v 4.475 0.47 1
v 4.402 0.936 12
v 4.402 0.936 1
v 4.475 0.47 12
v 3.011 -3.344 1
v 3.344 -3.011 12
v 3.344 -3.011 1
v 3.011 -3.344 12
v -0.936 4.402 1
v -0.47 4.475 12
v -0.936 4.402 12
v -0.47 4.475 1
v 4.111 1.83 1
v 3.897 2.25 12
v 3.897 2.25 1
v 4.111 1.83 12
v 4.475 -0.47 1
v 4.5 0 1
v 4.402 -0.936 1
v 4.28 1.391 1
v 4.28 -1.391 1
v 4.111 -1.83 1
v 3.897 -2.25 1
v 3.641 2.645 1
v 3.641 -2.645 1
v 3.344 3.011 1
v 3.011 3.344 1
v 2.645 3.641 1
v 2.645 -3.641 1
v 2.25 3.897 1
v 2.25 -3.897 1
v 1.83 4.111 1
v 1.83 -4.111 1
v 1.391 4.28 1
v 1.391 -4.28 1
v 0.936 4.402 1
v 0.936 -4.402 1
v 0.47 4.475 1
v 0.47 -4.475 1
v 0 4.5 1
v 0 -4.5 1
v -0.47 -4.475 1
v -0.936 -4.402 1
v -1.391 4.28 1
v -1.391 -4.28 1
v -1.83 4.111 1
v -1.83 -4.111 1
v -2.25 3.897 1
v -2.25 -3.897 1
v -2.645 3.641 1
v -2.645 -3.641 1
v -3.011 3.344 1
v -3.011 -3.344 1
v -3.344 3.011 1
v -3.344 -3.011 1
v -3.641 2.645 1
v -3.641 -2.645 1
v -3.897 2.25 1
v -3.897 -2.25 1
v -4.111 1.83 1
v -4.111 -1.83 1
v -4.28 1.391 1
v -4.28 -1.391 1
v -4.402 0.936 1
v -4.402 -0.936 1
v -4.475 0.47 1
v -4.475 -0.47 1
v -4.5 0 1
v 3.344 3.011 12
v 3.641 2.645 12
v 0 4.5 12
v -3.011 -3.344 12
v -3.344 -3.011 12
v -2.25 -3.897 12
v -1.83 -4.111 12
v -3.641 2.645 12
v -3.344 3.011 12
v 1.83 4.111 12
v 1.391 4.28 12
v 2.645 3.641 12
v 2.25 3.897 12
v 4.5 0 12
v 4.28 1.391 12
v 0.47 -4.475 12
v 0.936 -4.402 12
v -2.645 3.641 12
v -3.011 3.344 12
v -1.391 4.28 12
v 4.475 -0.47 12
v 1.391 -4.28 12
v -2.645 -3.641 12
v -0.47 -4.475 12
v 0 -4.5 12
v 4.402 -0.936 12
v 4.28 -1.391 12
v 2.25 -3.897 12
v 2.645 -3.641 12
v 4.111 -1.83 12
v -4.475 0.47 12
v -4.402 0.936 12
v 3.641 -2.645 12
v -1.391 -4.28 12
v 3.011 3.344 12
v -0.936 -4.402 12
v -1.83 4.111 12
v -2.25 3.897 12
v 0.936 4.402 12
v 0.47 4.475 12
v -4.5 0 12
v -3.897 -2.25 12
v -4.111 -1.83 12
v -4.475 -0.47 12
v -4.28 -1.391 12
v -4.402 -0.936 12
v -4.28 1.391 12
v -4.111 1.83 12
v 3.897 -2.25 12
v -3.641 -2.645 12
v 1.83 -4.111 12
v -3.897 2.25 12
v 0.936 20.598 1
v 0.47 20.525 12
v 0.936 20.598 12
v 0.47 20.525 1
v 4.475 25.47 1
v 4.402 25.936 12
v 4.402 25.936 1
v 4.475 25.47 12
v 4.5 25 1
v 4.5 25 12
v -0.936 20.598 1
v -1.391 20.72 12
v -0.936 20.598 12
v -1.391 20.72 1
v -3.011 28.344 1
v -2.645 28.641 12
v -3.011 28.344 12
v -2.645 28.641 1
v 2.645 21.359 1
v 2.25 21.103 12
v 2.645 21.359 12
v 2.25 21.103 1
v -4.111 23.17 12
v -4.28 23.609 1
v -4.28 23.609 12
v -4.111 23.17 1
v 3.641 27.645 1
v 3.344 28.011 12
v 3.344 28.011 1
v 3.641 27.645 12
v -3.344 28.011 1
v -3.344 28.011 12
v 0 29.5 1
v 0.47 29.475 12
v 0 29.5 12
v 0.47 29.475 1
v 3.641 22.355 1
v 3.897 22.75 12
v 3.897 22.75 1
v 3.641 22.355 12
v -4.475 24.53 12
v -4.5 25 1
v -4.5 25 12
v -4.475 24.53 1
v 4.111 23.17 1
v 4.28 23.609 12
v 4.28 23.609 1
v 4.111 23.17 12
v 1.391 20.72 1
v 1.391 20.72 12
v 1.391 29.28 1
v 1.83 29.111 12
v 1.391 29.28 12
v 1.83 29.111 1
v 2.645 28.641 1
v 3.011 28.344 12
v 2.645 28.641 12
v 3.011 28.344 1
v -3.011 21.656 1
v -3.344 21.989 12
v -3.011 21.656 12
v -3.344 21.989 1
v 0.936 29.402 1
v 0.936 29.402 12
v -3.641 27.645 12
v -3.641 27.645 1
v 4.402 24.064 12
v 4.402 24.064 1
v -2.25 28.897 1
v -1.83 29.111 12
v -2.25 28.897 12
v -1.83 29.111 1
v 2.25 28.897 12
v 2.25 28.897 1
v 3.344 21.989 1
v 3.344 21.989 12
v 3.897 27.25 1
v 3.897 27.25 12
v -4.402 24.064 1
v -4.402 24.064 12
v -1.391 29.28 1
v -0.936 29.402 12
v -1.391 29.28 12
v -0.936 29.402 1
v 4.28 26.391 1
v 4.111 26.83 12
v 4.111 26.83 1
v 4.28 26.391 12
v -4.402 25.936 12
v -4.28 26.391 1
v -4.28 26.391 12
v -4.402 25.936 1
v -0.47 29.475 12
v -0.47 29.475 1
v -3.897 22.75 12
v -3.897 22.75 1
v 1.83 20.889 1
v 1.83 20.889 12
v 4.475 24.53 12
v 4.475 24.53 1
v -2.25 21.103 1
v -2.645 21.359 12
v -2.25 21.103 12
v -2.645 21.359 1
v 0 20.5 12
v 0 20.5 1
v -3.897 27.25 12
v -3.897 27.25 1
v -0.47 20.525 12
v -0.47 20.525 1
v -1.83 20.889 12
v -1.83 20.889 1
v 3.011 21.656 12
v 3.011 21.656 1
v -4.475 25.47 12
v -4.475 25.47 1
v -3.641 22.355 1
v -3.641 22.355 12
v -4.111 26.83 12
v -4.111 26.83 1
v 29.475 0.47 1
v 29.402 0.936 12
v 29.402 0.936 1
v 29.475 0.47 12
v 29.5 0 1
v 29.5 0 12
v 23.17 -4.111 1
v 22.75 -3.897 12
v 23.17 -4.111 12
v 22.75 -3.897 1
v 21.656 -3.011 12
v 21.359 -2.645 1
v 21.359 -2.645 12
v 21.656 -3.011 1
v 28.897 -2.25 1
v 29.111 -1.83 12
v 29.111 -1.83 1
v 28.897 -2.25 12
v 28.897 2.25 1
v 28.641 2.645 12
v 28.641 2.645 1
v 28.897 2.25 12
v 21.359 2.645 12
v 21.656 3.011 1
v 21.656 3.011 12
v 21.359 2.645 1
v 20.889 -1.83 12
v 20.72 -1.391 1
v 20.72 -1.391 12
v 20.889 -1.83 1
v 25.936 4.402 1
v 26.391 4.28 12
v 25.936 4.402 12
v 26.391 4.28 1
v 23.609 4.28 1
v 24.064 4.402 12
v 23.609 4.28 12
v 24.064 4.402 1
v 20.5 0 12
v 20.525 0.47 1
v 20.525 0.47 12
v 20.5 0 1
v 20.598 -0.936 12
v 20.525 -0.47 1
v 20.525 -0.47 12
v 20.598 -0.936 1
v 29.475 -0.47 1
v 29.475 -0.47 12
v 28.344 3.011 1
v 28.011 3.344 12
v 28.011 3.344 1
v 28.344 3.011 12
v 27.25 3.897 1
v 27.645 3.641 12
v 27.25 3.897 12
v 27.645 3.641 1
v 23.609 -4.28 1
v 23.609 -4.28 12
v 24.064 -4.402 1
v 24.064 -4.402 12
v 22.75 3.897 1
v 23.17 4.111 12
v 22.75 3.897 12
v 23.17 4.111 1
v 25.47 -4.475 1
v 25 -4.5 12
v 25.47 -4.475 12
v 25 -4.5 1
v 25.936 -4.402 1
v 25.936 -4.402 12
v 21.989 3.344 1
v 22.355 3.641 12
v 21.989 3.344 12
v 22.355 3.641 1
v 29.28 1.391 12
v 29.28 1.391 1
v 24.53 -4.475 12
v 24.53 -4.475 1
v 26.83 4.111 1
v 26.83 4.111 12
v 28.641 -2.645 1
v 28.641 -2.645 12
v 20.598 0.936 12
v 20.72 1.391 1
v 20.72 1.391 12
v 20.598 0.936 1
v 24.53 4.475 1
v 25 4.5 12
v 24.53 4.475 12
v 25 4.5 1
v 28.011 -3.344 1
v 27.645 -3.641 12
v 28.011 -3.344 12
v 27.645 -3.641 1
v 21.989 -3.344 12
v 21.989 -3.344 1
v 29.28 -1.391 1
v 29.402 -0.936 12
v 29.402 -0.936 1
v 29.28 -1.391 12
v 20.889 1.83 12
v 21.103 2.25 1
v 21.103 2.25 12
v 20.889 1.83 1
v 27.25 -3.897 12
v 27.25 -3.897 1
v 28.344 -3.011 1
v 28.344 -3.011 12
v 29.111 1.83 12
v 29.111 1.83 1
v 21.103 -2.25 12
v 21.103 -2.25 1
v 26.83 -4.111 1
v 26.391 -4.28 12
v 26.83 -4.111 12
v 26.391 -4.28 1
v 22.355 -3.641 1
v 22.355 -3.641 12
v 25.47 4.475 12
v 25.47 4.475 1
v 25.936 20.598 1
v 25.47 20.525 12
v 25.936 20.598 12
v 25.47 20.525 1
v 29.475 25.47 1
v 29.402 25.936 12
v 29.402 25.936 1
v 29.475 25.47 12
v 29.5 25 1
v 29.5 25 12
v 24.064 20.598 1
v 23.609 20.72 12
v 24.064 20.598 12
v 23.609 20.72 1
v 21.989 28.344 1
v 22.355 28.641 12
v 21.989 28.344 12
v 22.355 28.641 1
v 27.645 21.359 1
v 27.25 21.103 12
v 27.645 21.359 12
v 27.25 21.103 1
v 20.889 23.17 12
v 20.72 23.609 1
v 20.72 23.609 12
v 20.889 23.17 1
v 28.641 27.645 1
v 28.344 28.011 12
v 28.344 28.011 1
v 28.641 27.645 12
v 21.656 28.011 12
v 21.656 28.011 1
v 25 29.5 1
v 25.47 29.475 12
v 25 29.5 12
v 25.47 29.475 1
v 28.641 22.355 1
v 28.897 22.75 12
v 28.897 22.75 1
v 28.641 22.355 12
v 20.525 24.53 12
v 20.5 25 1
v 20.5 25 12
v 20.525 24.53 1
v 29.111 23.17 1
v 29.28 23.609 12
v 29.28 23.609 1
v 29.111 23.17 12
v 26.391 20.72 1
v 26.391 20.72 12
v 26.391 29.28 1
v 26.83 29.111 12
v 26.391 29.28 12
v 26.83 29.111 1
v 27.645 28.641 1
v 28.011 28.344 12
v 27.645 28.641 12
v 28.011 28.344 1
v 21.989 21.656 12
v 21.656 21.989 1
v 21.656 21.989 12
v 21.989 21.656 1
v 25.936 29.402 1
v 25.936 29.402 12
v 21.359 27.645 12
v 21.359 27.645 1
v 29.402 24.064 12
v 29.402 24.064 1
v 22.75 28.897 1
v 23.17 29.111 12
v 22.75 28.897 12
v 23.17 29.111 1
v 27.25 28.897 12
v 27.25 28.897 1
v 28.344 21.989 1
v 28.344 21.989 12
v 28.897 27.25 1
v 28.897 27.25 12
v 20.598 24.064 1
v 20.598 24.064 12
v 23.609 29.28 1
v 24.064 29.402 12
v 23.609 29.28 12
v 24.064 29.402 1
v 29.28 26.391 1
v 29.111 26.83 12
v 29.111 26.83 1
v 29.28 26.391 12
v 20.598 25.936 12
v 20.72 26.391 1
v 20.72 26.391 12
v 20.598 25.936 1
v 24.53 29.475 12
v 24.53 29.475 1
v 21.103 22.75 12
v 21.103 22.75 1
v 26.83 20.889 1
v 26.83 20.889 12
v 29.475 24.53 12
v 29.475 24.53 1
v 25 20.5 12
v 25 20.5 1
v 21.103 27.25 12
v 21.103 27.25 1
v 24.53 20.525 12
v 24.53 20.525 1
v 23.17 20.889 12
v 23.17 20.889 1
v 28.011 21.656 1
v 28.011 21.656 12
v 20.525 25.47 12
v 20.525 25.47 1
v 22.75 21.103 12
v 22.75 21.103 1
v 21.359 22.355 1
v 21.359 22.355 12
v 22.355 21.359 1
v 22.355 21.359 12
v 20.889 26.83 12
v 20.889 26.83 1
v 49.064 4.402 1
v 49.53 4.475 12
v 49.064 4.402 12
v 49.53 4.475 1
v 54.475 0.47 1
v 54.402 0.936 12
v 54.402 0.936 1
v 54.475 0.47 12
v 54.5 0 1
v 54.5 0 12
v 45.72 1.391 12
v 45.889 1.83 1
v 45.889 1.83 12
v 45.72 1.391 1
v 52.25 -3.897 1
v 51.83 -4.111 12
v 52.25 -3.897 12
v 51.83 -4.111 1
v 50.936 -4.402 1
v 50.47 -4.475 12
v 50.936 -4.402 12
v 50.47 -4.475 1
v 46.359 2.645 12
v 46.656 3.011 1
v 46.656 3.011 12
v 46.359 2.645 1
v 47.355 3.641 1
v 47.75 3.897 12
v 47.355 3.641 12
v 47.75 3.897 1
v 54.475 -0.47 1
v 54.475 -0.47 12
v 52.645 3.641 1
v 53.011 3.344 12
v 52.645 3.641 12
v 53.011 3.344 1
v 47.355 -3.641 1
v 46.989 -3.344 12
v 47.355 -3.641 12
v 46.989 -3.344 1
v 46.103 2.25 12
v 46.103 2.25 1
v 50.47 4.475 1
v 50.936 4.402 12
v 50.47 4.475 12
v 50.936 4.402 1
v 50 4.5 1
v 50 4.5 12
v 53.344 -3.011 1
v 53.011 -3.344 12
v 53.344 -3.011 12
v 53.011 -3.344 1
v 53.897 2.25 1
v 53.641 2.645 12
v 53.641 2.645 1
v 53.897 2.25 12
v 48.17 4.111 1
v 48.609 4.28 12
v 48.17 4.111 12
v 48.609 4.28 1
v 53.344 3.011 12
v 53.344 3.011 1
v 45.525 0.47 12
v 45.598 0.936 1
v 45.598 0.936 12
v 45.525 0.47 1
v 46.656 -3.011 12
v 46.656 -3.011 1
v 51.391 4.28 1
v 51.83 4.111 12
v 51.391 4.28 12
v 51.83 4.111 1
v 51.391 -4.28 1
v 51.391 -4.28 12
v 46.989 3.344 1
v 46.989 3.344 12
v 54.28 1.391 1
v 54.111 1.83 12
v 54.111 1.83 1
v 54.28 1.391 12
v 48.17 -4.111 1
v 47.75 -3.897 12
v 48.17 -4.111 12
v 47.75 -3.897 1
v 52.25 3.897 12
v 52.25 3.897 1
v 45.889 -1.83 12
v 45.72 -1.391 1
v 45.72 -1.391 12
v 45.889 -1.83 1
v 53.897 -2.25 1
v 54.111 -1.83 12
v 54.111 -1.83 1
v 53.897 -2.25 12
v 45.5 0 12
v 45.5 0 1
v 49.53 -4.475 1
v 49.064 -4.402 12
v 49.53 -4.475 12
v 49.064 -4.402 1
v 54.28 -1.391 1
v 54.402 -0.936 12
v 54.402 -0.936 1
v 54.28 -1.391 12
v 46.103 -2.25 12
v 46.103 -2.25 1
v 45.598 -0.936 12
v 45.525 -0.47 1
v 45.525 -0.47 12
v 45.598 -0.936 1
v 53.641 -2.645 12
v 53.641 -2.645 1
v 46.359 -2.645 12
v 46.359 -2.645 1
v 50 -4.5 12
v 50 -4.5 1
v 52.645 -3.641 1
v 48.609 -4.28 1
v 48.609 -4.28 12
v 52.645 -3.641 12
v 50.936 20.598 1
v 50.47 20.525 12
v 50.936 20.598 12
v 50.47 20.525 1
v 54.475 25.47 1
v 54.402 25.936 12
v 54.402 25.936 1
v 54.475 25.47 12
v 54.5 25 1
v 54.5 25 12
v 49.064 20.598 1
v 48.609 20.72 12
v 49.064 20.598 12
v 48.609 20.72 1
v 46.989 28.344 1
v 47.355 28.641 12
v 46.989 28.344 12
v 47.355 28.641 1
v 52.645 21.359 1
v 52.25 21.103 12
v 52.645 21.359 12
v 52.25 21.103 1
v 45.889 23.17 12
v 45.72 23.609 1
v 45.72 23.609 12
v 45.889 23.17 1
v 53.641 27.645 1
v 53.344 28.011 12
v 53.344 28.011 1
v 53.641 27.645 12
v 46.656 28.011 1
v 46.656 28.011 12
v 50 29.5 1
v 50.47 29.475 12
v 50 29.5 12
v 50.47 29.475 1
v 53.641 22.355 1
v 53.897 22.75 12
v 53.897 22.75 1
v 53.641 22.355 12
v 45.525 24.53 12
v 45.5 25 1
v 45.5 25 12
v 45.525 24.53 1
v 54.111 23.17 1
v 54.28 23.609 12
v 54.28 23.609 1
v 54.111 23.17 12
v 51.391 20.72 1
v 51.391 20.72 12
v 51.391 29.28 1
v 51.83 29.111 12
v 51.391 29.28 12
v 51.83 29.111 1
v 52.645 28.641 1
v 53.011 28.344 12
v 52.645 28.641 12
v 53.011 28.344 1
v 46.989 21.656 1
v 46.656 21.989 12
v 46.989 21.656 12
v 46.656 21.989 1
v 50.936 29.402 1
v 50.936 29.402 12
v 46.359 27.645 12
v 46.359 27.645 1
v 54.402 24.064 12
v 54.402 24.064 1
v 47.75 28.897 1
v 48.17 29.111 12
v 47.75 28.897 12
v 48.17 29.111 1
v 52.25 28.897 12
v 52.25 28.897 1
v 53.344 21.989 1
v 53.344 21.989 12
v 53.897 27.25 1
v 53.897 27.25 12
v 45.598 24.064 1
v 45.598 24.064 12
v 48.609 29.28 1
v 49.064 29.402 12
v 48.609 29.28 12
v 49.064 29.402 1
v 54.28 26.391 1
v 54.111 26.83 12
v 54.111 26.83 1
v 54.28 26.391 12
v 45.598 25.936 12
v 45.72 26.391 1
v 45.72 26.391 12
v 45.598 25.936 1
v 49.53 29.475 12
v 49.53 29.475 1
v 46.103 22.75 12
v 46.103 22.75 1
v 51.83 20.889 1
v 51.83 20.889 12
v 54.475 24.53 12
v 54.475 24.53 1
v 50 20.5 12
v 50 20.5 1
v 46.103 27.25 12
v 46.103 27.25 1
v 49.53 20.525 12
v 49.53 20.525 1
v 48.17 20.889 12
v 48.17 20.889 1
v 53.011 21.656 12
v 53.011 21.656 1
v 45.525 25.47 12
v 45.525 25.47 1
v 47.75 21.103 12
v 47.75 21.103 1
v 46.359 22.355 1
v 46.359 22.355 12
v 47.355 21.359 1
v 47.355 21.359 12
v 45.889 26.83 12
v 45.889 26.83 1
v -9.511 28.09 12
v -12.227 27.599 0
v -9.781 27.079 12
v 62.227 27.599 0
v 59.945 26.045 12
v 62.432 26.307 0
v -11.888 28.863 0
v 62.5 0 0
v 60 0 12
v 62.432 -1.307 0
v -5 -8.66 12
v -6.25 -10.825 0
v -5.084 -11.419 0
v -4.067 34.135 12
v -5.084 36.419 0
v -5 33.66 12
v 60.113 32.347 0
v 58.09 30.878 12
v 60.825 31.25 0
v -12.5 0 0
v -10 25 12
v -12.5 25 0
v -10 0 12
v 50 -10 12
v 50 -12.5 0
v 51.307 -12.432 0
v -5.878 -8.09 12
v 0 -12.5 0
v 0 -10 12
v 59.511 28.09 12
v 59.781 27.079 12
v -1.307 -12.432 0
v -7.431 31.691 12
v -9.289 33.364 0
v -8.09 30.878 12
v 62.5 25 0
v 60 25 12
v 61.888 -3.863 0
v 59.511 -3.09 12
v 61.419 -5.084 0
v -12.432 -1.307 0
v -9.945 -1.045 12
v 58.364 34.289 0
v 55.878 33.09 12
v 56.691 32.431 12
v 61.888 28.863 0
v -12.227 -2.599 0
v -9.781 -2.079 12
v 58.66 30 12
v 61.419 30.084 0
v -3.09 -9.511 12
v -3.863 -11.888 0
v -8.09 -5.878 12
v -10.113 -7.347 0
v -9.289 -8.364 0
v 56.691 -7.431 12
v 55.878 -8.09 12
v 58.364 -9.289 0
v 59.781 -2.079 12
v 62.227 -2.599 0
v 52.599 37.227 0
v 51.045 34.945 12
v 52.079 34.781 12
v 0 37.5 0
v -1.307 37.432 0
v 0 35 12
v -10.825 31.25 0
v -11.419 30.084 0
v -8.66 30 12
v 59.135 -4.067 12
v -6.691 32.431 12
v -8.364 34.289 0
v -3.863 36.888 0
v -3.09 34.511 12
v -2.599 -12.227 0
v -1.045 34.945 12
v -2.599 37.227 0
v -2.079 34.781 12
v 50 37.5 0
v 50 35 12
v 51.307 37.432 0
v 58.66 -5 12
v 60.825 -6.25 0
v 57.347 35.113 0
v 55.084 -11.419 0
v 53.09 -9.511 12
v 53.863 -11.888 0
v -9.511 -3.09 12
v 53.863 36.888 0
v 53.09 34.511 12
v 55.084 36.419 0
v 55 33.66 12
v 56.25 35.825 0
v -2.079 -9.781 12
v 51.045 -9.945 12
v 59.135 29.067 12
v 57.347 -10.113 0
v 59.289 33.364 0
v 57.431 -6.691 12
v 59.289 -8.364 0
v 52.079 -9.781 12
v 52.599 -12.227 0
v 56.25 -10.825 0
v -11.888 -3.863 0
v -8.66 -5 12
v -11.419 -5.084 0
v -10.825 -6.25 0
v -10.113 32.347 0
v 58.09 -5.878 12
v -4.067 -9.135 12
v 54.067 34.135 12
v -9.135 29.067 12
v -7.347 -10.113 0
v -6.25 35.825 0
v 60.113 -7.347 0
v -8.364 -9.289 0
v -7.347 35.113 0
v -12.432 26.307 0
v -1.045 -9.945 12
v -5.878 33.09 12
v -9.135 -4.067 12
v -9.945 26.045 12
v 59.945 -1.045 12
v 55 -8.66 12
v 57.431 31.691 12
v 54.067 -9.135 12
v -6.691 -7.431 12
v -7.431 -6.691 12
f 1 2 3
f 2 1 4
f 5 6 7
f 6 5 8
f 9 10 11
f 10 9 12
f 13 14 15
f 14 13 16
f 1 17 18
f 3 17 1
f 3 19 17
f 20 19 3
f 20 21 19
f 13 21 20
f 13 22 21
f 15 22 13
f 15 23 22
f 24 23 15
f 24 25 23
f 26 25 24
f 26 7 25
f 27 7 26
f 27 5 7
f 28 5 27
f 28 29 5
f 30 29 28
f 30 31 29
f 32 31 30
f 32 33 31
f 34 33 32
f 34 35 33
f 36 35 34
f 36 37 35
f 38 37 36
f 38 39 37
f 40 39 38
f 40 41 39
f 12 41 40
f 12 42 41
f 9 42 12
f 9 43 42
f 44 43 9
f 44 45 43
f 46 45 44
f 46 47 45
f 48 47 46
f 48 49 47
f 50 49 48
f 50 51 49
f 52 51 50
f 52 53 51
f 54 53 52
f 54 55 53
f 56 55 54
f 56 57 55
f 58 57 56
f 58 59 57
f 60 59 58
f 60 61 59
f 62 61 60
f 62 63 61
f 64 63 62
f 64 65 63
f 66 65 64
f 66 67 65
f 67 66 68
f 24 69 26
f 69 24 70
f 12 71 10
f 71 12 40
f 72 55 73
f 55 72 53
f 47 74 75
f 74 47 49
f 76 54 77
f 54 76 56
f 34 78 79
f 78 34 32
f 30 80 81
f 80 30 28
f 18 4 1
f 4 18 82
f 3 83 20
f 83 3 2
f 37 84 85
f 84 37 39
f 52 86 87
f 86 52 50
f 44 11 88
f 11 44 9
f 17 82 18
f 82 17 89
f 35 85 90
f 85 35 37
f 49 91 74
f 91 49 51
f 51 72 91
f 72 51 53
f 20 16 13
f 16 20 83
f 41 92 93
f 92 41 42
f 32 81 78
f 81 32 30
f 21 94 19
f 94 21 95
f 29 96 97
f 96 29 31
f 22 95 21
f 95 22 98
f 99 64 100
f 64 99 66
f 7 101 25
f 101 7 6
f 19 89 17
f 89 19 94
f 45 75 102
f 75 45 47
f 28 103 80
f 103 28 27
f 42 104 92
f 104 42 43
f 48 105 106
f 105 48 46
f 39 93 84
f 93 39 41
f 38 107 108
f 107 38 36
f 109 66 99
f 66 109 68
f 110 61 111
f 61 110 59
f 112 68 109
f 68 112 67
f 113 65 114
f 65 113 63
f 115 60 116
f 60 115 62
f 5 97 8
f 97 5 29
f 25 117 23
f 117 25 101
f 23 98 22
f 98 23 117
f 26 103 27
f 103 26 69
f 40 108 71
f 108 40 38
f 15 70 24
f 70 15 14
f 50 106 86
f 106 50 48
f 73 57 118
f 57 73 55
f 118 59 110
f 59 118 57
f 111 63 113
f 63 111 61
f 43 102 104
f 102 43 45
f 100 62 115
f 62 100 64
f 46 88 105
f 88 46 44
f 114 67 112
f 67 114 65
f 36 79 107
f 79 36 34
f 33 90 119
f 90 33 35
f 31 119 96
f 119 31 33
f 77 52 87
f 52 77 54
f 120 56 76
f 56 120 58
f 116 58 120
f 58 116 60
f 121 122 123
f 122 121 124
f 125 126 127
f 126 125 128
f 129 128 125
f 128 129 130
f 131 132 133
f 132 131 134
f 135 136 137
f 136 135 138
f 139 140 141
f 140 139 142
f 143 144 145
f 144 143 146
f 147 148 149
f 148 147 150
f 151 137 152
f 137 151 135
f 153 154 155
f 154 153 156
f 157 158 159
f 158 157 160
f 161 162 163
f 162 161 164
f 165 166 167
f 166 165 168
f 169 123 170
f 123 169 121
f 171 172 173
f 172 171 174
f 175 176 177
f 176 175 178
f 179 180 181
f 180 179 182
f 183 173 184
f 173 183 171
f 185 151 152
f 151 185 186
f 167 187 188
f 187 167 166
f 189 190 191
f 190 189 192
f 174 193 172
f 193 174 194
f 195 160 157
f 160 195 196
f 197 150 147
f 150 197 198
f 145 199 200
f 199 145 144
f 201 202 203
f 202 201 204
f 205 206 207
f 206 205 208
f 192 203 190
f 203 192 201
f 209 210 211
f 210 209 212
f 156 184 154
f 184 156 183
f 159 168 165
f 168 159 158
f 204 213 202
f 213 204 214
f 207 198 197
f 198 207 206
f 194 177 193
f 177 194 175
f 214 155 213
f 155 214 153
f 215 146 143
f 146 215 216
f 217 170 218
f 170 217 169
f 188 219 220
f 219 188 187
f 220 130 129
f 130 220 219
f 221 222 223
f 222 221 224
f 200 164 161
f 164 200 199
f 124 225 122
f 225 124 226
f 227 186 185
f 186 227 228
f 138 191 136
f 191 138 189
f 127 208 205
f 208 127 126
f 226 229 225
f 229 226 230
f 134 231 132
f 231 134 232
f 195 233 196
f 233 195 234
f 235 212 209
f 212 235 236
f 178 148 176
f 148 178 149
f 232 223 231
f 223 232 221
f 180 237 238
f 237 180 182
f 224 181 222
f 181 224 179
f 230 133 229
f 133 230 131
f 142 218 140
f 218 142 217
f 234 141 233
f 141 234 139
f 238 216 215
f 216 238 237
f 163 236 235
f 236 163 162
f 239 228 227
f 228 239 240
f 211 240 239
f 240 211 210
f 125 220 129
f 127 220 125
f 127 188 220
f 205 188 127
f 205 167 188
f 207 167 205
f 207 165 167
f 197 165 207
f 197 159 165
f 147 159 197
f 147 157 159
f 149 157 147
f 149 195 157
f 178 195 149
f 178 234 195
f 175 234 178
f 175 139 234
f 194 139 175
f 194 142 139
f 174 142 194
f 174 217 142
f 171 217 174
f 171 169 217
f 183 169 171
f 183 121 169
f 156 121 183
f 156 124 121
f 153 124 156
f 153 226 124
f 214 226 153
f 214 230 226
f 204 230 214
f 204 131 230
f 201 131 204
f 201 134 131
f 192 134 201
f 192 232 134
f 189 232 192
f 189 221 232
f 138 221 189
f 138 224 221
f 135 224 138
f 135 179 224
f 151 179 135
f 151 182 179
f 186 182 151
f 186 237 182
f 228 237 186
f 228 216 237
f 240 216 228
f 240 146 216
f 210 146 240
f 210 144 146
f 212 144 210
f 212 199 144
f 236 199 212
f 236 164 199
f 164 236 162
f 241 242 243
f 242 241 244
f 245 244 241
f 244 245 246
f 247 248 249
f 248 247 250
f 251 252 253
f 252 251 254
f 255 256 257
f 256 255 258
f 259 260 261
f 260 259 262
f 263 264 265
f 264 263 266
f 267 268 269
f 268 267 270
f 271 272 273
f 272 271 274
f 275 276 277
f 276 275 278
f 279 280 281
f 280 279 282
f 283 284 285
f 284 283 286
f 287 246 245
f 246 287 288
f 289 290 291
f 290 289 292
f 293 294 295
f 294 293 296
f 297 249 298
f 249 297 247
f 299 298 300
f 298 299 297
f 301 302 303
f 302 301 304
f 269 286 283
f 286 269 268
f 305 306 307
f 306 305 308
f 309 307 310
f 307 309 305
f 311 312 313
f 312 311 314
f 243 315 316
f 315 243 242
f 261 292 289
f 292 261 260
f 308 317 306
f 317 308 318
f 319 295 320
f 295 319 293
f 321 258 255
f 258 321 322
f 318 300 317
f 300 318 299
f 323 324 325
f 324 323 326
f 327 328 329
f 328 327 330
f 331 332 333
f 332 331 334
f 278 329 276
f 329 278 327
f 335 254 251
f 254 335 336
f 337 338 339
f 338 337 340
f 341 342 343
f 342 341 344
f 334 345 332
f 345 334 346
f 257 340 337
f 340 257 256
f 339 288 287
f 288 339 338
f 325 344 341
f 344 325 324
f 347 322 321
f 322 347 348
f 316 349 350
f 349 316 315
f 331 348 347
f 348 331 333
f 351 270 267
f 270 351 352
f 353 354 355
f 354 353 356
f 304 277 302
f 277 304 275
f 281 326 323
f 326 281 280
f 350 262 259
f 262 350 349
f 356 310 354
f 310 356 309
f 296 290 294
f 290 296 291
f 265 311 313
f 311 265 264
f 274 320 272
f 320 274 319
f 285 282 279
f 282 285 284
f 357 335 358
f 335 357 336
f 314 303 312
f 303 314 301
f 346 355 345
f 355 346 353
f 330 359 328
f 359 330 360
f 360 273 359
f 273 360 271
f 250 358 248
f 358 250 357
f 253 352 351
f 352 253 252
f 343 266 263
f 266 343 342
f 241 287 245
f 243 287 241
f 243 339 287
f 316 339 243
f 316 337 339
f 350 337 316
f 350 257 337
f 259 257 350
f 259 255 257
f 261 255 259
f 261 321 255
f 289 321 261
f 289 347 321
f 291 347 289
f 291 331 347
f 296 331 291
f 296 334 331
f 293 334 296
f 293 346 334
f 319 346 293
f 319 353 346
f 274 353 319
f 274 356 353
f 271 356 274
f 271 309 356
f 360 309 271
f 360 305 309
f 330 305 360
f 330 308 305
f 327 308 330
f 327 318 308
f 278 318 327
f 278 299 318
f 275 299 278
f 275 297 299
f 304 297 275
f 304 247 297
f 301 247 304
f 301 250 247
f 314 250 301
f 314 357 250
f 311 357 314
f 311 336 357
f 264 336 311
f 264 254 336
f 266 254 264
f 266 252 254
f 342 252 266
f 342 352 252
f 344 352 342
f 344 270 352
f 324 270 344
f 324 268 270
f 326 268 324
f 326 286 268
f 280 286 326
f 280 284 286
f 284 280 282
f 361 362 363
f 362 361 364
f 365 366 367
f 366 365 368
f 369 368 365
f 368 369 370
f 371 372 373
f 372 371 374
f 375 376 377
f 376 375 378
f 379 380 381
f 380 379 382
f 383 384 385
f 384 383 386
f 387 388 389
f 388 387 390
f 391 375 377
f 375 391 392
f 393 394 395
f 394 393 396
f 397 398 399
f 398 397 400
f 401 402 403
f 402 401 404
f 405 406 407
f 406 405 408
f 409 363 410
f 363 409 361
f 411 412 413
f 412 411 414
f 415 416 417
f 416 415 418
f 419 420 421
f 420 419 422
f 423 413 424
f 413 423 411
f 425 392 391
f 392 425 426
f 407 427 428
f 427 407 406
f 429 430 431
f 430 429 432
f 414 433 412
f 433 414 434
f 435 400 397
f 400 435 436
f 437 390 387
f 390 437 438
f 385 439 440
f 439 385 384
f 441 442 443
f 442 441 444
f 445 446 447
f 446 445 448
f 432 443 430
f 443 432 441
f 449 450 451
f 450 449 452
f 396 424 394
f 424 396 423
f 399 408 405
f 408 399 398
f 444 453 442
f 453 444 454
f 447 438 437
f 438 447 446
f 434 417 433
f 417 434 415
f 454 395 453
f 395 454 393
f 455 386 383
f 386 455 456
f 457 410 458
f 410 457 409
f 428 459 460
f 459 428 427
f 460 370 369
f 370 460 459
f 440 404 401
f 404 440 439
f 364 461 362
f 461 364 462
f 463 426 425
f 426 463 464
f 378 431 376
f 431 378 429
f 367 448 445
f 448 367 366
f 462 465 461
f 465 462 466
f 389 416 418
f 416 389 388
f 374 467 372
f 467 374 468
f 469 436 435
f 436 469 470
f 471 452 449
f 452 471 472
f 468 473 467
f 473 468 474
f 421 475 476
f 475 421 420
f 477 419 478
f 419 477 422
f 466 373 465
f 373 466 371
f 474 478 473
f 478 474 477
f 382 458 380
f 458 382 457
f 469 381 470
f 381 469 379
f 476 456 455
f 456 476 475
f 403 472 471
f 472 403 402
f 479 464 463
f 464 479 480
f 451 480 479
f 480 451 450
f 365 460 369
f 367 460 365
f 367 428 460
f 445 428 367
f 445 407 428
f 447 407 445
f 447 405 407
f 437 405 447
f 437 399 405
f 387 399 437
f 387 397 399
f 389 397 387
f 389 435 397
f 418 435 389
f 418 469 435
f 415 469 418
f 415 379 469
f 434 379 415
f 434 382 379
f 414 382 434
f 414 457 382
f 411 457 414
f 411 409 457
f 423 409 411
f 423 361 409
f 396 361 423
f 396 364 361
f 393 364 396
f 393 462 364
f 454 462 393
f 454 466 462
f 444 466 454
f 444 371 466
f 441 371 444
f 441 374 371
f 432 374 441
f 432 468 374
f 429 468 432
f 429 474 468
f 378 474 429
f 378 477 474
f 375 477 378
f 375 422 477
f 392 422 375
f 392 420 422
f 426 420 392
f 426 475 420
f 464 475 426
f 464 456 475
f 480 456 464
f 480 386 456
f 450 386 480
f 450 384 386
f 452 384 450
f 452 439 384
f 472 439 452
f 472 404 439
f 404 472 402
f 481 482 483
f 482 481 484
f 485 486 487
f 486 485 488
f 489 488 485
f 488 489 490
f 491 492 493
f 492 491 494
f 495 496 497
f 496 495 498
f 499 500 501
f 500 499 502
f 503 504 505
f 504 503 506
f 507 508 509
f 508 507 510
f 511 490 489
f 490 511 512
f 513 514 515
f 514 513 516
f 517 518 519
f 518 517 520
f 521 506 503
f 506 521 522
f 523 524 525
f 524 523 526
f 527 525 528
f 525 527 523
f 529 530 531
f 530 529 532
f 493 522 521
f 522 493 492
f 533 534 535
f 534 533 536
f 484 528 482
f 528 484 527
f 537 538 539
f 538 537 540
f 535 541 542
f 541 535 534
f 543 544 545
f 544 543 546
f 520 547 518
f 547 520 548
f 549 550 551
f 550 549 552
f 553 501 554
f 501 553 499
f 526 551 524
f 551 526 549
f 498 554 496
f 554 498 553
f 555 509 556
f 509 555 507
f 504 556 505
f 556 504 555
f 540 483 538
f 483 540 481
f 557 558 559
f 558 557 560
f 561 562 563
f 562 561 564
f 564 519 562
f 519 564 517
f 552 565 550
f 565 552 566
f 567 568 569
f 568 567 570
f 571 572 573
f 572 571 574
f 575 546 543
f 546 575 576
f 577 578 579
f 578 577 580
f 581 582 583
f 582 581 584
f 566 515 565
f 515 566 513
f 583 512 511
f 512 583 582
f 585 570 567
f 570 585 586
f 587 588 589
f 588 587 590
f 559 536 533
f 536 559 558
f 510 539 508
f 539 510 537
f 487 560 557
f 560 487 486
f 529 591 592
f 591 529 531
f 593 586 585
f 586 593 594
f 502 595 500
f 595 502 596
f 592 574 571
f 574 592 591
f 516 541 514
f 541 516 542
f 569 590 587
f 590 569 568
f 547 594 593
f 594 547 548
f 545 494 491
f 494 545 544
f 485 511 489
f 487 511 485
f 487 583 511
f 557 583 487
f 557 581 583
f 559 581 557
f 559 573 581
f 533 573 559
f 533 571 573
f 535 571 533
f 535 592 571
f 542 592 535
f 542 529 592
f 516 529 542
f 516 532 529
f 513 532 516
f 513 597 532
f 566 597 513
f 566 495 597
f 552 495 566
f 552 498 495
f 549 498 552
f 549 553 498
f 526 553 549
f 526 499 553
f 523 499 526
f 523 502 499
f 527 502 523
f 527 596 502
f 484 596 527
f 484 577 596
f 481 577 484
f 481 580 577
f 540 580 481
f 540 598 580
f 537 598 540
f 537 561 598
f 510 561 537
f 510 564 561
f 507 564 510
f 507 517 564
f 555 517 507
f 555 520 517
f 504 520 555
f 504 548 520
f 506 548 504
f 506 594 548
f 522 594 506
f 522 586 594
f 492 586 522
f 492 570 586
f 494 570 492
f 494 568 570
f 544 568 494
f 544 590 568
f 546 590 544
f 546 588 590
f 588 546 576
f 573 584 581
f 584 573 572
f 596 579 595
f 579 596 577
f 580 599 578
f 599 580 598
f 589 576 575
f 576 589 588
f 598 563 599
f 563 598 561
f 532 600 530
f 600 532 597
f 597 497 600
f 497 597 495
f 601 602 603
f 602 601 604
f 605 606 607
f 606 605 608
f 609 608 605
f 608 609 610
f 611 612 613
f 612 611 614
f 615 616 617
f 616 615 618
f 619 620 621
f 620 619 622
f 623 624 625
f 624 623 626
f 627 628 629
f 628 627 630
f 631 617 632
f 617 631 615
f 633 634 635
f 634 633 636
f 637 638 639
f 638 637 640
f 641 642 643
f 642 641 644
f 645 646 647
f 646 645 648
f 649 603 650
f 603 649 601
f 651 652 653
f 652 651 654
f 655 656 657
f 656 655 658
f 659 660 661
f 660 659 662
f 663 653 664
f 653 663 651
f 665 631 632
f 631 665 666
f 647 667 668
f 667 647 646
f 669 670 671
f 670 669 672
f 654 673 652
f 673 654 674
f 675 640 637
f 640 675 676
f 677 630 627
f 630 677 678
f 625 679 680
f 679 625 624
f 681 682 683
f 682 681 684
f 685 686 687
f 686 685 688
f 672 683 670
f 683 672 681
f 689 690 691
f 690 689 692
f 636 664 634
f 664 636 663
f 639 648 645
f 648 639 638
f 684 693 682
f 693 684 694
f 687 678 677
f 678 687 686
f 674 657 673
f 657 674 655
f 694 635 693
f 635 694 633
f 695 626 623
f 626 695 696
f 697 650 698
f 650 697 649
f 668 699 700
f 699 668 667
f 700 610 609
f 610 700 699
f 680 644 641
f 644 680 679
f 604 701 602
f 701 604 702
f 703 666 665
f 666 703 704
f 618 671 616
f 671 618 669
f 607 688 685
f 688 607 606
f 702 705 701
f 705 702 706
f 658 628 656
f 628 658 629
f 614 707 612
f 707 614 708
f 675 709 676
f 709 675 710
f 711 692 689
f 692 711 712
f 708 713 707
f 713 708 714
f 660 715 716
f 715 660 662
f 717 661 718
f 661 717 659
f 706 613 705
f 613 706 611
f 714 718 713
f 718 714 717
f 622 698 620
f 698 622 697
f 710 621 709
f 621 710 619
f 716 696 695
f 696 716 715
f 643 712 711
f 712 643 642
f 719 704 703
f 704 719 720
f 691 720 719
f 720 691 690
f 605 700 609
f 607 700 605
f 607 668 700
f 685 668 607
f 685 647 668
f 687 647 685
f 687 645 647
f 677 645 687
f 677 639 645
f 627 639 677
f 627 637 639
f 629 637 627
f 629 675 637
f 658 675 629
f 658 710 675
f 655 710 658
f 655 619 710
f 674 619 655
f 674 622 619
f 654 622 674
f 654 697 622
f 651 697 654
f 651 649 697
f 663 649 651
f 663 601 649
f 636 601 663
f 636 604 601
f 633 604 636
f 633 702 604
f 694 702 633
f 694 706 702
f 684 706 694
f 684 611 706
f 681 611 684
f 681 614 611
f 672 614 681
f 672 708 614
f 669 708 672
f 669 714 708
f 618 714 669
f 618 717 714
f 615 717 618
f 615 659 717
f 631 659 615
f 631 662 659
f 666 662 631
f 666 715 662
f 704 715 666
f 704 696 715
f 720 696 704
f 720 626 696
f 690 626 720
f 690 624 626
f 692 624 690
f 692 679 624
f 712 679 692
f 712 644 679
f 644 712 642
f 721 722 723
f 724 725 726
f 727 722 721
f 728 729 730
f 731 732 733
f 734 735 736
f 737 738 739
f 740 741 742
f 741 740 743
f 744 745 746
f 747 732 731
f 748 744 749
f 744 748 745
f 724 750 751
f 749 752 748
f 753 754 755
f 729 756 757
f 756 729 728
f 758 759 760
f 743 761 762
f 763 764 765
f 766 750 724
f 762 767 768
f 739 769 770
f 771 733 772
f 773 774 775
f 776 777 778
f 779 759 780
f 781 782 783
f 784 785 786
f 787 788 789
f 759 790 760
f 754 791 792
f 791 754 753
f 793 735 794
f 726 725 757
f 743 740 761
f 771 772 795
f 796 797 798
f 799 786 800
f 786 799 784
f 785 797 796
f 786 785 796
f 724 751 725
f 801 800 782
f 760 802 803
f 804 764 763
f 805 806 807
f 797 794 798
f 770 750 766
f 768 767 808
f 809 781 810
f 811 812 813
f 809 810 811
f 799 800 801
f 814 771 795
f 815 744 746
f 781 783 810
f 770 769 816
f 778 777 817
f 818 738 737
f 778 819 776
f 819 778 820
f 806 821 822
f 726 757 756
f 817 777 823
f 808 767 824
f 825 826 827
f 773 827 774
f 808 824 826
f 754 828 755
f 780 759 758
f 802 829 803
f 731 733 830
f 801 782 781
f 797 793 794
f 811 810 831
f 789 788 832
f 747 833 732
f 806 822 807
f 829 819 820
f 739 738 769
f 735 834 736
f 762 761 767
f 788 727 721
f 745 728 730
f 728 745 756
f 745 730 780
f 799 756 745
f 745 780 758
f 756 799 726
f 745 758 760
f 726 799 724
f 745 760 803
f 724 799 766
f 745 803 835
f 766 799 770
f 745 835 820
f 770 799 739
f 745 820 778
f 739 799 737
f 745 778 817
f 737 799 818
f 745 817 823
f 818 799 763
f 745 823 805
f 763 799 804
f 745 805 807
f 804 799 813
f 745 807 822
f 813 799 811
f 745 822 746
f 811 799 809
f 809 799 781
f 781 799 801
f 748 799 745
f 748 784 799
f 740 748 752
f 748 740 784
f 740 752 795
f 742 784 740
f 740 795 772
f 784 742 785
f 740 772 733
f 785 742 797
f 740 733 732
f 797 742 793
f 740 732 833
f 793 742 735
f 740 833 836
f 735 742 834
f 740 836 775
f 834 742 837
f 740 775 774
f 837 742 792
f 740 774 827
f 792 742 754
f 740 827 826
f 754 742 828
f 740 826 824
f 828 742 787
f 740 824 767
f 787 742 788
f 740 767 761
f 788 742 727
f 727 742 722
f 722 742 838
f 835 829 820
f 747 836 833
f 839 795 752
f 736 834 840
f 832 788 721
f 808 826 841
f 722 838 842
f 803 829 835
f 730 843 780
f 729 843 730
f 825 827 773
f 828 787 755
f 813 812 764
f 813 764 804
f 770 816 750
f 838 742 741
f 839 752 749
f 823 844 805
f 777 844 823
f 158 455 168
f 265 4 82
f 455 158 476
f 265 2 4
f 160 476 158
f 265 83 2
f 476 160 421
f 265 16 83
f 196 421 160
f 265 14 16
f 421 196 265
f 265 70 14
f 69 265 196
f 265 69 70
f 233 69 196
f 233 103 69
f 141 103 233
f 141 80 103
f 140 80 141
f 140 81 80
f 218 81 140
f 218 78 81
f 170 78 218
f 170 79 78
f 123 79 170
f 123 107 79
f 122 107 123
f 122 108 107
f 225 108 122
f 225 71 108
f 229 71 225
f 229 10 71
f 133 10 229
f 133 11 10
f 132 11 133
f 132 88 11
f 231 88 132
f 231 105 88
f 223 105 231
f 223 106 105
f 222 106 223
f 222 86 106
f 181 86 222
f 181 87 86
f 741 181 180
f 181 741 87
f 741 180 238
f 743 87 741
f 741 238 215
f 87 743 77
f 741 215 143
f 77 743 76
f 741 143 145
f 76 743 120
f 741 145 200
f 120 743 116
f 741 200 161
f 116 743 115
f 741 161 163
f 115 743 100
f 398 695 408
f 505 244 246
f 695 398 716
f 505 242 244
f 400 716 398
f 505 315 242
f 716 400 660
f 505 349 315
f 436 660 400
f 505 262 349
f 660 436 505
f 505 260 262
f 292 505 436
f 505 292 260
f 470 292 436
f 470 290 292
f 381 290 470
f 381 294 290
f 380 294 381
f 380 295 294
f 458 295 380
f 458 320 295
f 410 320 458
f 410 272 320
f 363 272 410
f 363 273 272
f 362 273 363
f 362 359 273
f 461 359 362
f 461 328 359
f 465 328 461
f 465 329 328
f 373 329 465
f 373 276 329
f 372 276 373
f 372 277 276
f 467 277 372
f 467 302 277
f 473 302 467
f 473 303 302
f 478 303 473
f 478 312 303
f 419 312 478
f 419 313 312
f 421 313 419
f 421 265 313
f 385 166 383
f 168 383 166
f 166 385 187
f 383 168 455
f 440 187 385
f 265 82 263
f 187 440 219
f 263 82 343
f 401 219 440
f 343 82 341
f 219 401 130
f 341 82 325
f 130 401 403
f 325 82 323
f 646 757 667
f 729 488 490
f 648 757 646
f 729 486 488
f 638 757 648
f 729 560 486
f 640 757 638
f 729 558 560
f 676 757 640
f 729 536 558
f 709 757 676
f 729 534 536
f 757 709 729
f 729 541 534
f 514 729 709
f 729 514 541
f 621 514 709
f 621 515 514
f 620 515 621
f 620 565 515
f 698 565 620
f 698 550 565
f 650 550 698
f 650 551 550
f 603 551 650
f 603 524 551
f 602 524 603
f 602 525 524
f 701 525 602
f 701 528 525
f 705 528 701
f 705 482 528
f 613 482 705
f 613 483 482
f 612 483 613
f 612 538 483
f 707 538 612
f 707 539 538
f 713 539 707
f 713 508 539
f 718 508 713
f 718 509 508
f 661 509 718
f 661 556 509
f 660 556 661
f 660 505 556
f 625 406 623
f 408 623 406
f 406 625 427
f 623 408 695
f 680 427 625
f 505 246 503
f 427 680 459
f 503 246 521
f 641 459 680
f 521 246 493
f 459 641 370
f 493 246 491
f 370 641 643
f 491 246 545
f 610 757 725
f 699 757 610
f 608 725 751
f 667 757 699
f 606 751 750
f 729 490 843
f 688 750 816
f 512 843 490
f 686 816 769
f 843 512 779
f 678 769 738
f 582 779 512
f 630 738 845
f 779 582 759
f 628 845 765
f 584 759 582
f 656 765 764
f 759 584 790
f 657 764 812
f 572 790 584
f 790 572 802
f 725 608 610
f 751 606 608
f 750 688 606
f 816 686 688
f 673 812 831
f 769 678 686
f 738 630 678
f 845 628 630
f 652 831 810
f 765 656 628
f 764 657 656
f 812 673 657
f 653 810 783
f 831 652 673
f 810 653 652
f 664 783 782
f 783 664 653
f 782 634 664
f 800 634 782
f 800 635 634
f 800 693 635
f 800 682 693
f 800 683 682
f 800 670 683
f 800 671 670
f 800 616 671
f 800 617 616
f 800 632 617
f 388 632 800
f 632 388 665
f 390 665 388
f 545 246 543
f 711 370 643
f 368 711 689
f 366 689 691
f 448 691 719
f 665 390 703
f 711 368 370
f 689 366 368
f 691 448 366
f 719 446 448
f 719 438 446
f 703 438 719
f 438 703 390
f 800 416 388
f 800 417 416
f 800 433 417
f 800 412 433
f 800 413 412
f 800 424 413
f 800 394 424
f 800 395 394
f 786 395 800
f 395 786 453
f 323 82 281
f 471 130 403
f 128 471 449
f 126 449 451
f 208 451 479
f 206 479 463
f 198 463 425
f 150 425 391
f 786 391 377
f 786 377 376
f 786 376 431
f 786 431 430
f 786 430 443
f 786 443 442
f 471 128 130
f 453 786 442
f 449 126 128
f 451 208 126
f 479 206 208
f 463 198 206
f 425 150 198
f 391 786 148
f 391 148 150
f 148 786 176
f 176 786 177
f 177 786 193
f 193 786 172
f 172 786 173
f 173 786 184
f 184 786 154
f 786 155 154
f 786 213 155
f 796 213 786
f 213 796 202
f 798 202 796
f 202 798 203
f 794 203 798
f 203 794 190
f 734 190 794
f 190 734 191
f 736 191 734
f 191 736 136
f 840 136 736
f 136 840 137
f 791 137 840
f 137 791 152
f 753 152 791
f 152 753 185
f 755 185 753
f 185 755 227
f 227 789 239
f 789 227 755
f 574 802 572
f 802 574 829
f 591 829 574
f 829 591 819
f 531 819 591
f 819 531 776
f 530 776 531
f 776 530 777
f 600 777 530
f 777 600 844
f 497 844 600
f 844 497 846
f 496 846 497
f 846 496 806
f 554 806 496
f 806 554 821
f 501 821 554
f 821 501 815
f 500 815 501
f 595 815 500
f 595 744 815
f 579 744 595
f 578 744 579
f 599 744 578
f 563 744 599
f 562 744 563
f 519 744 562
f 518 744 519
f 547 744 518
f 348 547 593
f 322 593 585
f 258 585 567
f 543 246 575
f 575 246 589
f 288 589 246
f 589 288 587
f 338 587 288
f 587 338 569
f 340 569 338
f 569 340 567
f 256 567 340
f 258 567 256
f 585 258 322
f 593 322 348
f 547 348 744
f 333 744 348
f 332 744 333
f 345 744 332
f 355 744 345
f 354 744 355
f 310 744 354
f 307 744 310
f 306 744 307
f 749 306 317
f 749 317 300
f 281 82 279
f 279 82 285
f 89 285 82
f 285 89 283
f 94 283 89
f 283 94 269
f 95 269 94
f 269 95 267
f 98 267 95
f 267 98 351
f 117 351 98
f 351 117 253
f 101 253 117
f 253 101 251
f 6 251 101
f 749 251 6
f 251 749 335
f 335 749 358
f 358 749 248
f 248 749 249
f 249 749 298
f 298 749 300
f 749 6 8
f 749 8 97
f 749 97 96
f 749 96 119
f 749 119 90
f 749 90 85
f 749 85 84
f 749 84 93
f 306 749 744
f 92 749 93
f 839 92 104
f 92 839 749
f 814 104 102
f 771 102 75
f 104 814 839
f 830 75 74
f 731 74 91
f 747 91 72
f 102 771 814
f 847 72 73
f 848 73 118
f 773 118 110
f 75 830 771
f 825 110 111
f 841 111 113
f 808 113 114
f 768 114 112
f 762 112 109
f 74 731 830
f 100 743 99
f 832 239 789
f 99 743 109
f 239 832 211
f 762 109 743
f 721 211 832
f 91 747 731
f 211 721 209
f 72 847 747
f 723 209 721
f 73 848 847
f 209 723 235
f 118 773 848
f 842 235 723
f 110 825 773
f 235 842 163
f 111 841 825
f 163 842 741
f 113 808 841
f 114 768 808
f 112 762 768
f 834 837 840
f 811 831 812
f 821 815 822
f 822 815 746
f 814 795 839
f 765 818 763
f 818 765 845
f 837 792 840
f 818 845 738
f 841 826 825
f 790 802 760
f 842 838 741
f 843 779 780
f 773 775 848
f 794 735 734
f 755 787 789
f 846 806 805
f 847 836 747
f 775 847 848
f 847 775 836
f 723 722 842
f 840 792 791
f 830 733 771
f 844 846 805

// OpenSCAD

// Describe the support capacity
 number_of_rows=2; //[ 1, 2, 3, 4, 5, 6 , 7 , 8]
 number_of_holes_per_row=3; //[ 1, 2, 3, 4, 5, 6 , 7 , 8]


// Describe your biggest atomizer :
max_atomizer_diameter=20; //[ 16, 17, 18, 19, 20, 21 , 22 , 23, 24, 25, 26, 27, 28, 29 , 30 , 31, 32]
diameter_of_holes=9;//[ 6, 7, 8, 9, 10, 11 , 12 , 13]
hole_depth = 10; // [6,7,8,9,10,11,12,13,14]


//Additional space between holes    
 additional_space=5;// [6,7,8,9,10,11,12,13,14]


// ignore variable values

//this is a teinturman design.
//you can find the published thing from thingiverse at : 
//http://www.thingiverse.com/thing:2019106



AtomizerStand();


module AtomizerStand()
{
$fn=60;
       
 taillez=hole_depth+2;   
 base_diameter=max_atomizer_diameter+5;
 
    
 taillex=(number_of_holes_per_row-1)*(2*(max_atomizer_diameter/2)+additional_space);
 tailley=(number_of_rows-1)*(2*(max_atomizer_diameter/2)+additional_space);

  difference()
  {  

    hull()
    {
        translate([taillex,0,0])cylinder(r1= base_diameter/2,r2=(max_atomizer_diameter/2),h=taillez);
        translate([taillex,tailley,0])cylinder(r1= base_diameter/2,r2=(max_atomizer_diameter/2),h=taillez);
        translate([0,tailley,0])cylinder(r1= base_diameter/2,r2=(max_atomizer_diameter/2),h=taillez);
        translate([0,0,0])cylinder(r1= base_diameter/2,r2=(max_atomizer_diameter/2),h=taillez);
    }
    
    for (i = [0: 1:number_of_holes_per_row-1]) {
    for (j = [0:1:number_of_rows-1]) {
        translate([i*(2*(max_atomizer_diameter/2)+additional_space) ,j*(2*(max_atomizer_diameter/2)+additional_space),1])cylinder(r=diameter_of_holes/2,h=taillez);
    }
    }
 
} 
}

